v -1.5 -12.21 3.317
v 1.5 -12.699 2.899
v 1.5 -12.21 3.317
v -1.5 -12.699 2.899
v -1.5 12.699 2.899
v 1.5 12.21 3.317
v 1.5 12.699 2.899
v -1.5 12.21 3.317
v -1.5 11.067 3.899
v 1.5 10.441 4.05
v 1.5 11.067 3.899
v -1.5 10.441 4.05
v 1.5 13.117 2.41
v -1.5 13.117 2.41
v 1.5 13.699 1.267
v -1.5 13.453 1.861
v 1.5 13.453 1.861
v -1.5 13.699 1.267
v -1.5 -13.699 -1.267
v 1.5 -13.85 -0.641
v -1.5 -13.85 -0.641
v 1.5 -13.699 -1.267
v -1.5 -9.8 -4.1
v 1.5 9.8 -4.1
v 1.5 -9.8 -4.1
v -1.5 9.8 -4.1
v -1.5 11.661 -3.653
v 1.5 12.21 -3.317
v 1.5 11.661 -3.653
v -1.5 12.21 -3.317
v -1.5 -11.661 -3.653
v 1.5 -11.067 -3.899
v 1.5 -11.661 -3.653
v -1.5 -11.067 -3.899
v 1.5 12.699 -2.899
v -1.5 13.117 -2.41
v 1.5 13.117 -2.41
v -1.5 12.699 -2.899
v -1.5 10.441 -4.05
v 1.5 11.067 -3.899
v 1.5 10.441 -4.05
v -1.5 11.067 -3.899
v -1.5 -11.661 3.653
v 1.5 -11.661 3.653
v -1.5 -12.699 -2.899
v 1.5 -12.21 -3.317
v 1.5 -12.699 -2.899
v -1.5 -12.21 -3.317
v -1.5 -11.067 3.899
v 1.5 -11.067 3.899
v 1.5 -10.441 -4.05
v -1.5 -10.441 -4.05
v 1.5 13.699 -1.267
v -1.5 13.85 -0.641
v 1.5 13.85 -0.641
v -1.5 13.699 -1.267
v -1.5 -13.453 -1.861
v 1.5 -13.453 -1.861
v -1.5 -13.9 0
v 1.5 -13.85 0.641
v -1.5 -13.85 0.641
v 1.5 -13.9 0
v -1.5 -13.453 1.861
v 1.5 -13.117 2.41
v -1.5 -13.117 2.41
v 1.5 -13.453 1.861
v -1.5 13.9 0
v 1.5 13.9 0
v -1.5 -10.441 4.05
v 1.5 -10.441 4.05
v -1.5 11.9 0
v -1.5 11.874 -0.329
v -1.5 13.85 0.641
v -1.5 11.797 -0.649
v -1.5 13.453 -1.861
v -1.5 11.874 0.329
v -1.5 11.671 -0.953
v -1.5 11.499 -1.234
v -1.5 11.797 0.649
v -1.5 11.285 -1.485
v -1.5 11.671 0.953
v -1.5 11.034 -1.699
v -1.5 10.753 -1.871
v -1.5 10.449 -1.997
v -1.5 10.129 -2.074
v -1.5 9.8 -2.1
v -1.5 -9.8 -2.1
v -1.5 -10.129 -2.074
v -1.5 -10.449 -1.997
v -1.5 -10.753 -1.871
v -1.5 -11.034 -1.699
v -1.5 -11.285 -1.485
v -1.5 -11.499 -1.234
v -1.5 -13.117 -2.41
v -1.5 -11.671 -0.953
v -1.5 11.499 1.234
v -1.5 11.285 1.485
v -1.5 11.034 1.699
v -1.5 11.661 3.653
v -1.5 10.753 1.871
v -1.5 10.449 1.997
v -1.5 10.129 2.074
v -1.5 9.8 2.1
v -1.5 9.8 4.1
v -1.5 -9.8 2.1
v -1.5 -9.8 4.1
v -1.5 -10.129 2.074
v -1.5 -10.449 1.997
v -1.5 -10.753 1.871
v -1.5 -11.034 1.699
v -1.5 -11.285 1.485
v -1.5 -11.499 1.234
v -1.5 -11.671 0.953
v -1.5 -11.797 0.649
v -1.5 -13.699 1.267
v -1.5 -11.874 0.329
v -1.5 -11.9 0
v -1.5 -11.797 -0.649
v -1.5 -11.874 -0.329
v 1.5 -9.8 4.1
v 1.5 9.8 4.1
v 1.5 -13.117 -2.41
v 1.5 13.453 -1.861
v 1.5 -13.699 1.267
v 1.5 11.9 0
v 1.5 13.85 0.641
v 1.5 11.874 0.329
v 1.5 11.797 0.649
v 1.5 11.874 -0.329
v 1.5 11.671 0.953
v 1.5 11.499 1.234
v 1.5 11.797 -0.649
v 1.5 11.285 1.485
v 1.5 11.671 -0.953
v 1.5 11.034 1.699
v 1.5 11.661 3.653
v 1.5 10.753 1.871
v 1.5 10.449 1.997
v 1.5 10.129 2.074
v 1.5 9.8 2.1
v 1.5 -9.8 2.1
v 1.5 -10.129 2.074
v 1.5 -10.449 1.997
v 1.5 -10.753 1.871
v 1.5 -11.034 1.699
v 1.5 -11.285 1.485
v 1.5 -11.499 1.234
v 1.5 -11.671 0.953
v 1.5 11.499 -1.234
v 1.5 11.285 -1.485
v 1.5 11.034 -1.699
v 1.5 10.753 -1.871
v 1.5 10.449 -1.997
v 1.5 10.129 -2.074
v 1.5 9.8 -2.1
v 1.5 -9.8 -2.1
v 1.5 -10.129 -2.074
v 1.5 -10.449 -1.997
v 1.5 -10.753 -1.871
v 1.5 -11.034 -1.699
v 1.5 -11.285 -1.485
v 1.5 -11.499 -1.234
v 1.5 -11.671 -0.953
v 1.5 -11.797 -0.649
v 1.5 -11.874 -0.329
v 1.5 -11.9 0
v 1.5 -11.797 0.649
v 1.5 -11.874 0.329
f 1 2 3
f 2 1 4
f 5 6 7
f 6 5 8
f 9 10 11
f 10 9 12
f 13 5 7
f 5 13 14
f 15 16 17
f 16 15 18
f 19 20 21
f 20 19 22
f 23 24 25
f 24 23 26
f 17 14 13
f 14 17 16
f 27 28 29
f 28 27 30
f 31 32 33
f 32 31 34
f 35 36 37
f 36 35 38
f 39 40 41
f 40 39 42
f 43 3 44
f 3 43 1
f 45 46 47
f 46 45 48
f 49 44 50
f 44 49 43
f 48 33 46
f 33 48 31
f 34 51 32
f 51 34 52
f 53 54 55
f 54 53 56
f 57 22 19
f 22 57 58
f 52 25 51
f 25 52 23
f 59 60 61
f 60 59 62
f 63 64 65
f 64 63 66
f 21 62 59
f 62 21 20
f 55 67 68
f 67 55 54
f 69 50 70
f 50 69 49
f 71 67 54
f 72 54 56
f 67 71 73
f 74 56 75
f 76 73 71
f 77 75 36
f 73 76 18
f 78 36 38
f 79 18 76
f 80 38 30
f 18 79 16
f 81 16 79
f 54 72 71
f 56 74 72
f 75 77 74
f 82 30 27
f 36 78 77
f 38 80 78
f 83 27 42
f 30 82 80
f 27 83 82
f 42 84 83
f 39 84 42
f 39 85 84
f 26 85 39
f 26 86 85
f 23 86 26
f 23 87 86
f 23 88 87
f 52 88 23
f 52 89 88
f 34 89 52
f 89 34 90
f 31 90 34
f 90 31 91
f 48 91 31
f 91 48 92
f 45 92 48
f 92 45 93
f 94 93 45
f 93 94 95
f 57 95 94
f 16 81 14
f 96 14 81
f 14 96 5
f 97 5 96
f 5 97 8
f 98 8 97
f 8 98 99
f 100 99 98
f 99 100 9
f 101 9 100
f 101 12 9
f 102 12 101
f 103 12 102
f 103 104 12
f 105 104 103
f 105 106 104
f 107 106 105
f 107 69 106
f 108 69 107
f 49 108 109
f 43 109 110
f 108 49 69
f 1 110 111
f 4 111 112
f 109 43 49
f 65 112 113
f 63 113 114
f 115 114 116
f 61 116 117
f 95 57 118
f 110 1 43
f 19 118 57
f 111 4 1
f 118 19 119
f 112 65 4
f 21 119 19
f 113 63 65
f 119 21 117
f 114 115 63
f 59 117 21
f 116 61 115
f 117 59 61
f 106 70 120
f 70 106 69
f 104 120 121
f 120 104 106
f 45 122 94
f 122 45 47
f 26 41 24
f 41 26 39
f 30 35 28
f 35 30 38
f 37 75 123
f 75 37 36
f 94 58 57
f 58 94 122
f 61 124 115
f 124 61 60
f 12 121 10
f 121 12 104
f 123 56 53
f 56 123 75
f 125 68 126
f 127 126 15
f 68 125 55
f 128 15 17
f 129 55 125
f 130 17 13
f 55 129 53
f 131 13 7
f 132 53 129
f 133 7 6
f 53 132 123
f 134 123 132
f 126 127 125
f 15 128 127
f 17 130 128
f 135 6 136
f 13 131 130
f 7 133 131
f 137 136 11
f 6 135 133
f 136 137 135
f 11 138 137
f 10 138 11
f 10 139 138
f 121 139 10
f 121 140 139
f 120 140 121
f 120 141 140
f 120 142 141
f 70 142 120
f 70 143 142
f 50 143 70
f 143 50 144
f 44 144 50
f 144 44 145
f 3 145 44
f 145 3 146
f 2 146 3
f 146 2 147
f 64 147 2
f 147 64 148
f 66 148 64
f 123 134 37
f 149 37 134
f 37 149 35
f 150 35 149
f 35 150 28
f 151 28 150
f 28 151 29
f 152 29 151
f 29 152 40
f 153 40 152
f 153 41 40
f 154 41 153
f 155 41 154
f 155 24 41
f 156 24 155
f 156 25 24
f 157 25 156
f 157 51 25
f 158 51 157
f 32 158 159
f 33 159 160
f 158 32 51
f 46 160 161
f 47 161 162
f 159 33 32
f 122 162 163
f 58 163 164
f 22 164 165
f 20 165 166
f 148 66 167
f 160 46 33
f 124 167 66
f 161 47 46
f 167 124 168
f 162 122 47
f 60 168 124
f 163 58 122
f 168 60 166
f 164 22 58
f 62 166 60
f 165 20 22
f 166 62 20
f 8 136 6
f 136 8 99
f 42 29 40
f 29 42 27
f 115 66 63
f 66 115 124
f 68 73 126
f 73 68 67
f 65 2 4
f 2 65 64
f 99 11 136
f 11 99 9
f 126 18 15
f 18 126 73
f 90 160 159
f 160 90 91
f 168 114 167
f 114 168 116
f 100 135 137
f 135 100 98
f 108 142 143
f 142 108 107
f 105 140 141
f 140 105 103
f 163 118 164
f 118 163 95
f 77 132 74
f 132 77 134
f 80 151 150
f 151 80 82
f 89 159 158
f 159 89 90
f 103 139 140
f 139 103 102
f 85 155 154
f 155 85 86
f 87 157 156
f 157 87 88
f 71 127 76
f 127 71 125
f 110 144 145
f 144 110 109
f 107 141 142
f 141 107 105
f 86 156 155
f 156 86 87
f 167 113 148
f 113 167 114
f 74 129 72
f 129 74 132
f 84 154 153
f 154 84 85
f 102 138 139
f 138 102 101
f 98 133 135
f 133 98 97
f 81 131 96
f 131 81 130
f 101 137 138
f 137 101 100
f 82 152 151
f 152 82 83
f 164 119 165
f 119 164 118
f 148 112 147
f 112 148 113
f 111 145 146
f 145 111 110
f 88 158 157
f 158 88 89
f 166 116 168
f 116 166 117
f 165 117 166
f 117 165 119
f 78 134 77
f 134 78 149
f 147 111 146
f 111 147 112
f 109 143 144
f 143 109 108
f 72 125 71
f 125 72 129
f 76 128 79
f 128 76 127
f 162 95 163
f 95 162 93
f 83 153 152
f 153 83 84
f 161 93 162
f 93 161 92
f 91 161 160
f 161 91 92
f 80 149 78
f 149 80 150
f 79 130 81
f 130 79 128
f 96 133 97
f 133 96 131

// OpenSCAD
//Watch Strap keeper
//by Khairulmizam Samsudin, Sept 2016
//xource@gmail.com
//"watch_strap_keeper" is licenced under Creative Commons :
//Attribution-NonCommercial-ShareAlike 4.0 International (CC BY-NC-SA 4.0)
//http://creativecommons.org/licenses/by-nc-sa/4.0/

//UPDATES:
//22/9/2016 - Released

/* [Options] */
// preview[view:south east, tilt:top diagonal]
// Watch strap thickness. Be sure to increase the thickness if the strap make several pass through the keeper. i.e. Nato or Zulu strap.   
Strap_thickness=1.2*3.5; // [1:10]
// Width of the strap.
Strap_width=24; // [5:30]
// Thickness of the keeper.
Keeper_thickness=2; // [1:5]
// Width of the keeper.
Keeper_width=3; // [1:5]
//Shape of keeper edge.
Edge = 1; //[0:Square, 1:Round]
//Strap entry slit.
Slit = 0; //[0:No, 1:Yes]
// Position for printing.
Print=0; // [0:No, 1:Yes]

/* [Hidden] */

strapT=Strap_thickness;
strapW=Strap_width;
keeperT=Keeper_thickness;
keeperW=strapW+keeperT*2;
keeperL=Keeper_width;
keeperH=strapT+keeperT*2;
edge=Edge;
slit=Slit; //entry slit
slitAngle=0;
print=Print;
epsilon=0.1;
$fn=40;

module strap() {
    cube([strapW*3,strapW,strapT],center=true);
}

module kround(T=keeperT,e=0) {
    kR=strapT/2;
    hull() {
        translate([0,keeperW/2-kR*2,0]) rotate([0,90,0]) cylinder(r=kR+T,h=keeperL+e,center=true);
        translate([0,-keeperW/2+kR*2,0]) rotate([0,90,0]) cylinder(r=kR+T,h=keeperL+e,center=true);
    }
}

module keeper() {
    if (edge) {
        difference() {
            kround();
            kround(T=0,e=epsilon);
        }
    } else {
        difference() {
            cube([keeperL,keeperW,keeperH],center=true);
            cube([keeperL+epsilon,strapW,strapT],center=true);
        }
    }
}

rotY = print?90:0;
 rotate([0,rotY,0]) union() {
    %strap();
    difference() {
        keeper();
        if (slit) {
            rotate([0,0,slitAngle]) translate([0,0,-keeperH/2]) cube([keeperL*4,keeperW/6,keeperH],center=true);
        }
    }
}
